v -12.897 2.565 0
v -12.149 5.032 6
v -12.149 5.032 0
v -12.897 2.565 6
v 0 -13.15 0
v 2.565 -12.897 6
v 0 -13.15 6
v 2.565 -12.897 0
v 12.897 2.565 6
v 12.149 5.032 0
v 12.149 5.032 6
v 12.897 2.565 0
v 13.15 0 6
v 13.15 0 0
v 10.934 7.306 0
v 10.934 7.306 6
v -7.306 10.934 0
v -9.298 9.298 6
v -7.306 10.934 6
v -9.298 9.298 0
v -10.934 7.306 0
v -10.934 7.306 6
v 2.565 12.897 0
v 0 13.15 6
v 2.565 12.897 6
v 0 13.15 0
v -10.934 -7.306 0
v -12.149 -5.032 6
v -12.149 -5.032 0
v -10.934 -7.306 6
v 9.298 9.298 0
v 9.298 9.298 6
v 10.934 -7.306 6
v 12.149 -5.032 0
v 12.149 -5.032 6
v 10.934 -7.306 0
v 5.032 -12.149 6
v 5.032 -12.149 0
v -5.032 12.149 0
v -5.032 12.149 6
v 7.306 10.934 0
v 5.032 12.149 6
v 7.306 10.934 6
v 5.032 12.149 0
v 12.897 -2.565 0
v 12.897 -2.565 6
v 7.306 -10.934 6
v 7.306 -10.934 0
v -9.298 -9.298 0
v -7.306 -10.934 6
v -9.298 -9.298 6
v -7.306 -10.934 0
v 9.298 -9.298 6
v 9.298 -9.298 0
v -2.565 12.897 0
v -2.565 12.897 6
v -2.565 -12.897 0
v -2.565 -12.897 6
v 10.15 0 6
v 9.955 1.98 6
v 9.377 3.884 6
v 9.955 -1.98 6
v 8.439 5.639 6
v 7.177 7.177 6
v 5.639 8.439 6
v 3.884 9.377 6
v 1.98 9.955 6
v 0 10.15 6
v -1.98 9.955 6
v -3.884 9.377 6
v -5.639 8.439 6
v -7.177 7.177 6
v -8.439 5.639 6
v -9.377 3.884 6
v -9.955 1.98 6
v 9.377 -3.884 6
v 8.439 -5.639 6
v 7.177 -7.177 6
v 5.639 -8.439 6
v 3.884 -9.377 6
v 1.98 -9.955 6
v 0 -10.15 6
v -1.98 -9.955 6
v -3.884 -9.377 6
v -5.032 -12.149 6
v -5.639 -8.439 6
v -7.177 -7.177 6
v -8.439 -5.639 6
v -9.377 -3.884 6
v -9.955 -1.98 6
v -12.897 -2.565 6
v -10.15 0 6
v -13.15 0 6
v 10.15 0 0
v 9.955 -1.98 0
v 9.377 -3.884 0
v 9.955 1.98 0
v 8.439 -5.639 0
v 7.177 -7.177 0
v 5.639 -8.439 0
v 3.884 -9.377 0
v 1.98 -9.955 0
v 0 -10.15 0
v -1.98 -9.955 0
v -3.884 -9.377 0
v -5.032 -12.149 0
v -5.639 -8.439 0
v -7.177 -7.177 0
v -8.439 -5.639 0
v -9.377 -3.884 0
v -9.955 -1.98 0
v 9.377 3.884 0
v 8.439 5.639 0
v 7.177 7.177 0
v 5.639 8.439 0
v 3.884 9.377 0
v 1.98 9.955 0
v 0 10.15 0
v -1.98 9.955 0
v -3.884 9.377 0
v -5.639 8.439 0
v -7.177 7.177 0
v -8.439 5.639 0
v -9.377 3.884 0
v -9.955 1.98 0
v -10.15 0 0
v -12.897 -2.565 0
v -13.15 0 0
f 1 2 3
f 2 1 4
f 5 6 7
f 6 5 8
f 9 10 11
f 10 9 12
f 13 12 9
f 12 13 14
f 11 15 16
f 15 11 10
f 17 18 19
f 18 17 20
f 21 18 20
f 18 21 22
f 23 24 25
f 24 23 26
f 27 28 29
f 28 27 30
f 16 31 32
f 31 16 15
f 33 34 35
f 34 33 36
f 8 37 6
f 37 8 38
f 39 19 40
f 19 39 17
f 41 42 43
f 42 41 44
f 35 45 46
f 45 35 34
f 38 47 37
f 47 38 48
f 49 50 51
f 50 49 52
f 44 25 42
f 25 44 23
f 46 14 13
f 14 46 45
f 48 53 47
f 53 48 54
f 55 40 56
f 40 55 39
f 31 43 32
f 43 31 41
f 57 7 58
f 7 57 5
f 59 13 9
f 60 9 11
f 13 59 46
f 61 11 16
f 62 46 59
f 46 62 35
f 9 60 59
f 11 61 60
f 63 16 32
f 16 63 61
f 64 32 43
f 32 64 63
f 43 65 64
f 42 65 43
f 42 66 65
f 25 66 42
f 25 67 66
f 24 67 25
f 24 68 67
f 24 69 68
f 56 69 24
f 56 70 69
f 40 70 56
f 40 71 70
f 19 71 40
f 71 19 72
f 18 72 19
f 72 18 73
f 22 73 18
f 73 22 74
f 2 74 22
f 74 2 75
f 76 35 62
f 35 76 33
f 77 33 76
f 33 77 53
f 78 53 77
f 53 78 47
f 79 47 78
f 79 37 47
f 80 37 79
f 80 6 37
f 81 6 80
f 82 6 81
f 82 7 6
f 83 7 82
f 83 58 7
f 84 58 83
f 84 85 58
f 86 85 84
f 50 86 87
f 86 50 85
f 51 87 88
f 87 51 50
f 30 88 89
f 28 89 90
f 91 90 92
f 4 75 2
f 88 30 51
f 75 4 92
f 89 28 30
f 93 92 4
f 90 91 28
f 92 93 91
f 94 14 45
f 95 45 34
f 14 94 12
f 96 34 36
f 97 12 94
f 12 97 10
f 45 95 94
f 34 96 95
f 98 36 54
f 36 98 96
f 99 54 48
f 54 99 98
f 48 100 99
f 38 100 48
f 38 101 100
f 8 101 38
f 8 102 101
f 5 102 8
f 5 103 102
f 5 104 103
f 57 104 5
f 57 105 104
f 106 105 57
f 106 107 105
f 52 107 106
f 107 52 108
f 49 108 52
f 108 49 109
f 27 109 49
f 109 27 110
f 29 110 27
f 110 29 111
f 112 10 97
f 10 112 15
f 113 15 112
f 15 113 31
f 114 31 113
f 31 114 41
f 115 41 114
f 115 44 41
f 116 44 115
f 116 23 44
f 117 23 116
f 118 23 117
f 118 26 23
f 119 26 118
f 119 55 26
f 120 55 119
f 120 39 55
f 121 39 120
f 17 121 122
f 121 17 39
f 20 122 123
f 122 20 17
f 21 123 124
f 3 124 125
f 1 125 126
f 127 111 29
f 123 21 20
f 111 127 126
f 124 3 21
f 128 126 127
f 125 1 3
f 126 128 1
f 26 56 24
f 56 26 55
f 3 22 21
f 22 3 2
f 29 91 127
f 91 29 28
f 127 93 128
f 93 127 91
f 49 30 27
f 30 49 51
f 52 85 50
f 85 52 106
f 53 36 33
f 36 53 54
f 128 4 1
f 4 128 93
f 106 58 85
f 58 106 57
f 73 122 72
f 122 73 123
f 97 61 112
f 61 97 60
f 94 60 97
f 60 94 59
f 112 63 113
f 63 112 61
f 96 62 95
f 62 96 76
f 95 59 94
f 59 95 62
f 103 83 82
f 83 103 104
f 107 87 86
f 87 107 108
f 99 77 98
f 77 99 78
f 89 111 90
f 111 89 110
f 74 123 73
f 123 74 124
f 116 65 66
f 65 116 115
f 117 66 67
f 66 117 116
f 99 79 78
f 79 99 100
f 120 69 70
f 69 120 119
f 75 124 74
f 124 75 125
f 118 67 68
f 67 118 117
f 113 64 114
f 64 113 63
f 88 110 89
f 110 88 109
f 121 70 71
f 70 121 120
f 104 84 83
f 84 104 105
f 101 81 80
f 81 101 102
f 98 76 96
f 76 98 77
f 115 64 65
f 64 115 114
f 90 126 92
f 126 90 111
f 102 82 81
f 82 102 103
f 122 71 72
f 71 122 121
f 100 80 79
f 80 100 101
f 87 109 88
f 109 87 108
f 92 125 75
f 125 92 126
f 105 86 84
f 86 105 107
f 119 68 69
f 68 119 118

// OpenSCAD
$fn = 32;

// ----------------------------------------------------------------------
// Spacer sleeve: 26.3 / 20.3 x 6 mm
// ----------------------------------------------------------------------

// --- parameters (mm) ---
sleeve_od = 26.3;         // outside diameter
sleeve_id = 20.3;         // shaft bore
sleeve_l = 6;             // sleeve length

module sleeve() {
  cylinder(h = sleeve_l, d = sleeve_od);
}

difference() {
  sleeve();
  translate([0, 0, -1]) cylinder(h = sleeve_l + 2, d = sleeve_id);
}
